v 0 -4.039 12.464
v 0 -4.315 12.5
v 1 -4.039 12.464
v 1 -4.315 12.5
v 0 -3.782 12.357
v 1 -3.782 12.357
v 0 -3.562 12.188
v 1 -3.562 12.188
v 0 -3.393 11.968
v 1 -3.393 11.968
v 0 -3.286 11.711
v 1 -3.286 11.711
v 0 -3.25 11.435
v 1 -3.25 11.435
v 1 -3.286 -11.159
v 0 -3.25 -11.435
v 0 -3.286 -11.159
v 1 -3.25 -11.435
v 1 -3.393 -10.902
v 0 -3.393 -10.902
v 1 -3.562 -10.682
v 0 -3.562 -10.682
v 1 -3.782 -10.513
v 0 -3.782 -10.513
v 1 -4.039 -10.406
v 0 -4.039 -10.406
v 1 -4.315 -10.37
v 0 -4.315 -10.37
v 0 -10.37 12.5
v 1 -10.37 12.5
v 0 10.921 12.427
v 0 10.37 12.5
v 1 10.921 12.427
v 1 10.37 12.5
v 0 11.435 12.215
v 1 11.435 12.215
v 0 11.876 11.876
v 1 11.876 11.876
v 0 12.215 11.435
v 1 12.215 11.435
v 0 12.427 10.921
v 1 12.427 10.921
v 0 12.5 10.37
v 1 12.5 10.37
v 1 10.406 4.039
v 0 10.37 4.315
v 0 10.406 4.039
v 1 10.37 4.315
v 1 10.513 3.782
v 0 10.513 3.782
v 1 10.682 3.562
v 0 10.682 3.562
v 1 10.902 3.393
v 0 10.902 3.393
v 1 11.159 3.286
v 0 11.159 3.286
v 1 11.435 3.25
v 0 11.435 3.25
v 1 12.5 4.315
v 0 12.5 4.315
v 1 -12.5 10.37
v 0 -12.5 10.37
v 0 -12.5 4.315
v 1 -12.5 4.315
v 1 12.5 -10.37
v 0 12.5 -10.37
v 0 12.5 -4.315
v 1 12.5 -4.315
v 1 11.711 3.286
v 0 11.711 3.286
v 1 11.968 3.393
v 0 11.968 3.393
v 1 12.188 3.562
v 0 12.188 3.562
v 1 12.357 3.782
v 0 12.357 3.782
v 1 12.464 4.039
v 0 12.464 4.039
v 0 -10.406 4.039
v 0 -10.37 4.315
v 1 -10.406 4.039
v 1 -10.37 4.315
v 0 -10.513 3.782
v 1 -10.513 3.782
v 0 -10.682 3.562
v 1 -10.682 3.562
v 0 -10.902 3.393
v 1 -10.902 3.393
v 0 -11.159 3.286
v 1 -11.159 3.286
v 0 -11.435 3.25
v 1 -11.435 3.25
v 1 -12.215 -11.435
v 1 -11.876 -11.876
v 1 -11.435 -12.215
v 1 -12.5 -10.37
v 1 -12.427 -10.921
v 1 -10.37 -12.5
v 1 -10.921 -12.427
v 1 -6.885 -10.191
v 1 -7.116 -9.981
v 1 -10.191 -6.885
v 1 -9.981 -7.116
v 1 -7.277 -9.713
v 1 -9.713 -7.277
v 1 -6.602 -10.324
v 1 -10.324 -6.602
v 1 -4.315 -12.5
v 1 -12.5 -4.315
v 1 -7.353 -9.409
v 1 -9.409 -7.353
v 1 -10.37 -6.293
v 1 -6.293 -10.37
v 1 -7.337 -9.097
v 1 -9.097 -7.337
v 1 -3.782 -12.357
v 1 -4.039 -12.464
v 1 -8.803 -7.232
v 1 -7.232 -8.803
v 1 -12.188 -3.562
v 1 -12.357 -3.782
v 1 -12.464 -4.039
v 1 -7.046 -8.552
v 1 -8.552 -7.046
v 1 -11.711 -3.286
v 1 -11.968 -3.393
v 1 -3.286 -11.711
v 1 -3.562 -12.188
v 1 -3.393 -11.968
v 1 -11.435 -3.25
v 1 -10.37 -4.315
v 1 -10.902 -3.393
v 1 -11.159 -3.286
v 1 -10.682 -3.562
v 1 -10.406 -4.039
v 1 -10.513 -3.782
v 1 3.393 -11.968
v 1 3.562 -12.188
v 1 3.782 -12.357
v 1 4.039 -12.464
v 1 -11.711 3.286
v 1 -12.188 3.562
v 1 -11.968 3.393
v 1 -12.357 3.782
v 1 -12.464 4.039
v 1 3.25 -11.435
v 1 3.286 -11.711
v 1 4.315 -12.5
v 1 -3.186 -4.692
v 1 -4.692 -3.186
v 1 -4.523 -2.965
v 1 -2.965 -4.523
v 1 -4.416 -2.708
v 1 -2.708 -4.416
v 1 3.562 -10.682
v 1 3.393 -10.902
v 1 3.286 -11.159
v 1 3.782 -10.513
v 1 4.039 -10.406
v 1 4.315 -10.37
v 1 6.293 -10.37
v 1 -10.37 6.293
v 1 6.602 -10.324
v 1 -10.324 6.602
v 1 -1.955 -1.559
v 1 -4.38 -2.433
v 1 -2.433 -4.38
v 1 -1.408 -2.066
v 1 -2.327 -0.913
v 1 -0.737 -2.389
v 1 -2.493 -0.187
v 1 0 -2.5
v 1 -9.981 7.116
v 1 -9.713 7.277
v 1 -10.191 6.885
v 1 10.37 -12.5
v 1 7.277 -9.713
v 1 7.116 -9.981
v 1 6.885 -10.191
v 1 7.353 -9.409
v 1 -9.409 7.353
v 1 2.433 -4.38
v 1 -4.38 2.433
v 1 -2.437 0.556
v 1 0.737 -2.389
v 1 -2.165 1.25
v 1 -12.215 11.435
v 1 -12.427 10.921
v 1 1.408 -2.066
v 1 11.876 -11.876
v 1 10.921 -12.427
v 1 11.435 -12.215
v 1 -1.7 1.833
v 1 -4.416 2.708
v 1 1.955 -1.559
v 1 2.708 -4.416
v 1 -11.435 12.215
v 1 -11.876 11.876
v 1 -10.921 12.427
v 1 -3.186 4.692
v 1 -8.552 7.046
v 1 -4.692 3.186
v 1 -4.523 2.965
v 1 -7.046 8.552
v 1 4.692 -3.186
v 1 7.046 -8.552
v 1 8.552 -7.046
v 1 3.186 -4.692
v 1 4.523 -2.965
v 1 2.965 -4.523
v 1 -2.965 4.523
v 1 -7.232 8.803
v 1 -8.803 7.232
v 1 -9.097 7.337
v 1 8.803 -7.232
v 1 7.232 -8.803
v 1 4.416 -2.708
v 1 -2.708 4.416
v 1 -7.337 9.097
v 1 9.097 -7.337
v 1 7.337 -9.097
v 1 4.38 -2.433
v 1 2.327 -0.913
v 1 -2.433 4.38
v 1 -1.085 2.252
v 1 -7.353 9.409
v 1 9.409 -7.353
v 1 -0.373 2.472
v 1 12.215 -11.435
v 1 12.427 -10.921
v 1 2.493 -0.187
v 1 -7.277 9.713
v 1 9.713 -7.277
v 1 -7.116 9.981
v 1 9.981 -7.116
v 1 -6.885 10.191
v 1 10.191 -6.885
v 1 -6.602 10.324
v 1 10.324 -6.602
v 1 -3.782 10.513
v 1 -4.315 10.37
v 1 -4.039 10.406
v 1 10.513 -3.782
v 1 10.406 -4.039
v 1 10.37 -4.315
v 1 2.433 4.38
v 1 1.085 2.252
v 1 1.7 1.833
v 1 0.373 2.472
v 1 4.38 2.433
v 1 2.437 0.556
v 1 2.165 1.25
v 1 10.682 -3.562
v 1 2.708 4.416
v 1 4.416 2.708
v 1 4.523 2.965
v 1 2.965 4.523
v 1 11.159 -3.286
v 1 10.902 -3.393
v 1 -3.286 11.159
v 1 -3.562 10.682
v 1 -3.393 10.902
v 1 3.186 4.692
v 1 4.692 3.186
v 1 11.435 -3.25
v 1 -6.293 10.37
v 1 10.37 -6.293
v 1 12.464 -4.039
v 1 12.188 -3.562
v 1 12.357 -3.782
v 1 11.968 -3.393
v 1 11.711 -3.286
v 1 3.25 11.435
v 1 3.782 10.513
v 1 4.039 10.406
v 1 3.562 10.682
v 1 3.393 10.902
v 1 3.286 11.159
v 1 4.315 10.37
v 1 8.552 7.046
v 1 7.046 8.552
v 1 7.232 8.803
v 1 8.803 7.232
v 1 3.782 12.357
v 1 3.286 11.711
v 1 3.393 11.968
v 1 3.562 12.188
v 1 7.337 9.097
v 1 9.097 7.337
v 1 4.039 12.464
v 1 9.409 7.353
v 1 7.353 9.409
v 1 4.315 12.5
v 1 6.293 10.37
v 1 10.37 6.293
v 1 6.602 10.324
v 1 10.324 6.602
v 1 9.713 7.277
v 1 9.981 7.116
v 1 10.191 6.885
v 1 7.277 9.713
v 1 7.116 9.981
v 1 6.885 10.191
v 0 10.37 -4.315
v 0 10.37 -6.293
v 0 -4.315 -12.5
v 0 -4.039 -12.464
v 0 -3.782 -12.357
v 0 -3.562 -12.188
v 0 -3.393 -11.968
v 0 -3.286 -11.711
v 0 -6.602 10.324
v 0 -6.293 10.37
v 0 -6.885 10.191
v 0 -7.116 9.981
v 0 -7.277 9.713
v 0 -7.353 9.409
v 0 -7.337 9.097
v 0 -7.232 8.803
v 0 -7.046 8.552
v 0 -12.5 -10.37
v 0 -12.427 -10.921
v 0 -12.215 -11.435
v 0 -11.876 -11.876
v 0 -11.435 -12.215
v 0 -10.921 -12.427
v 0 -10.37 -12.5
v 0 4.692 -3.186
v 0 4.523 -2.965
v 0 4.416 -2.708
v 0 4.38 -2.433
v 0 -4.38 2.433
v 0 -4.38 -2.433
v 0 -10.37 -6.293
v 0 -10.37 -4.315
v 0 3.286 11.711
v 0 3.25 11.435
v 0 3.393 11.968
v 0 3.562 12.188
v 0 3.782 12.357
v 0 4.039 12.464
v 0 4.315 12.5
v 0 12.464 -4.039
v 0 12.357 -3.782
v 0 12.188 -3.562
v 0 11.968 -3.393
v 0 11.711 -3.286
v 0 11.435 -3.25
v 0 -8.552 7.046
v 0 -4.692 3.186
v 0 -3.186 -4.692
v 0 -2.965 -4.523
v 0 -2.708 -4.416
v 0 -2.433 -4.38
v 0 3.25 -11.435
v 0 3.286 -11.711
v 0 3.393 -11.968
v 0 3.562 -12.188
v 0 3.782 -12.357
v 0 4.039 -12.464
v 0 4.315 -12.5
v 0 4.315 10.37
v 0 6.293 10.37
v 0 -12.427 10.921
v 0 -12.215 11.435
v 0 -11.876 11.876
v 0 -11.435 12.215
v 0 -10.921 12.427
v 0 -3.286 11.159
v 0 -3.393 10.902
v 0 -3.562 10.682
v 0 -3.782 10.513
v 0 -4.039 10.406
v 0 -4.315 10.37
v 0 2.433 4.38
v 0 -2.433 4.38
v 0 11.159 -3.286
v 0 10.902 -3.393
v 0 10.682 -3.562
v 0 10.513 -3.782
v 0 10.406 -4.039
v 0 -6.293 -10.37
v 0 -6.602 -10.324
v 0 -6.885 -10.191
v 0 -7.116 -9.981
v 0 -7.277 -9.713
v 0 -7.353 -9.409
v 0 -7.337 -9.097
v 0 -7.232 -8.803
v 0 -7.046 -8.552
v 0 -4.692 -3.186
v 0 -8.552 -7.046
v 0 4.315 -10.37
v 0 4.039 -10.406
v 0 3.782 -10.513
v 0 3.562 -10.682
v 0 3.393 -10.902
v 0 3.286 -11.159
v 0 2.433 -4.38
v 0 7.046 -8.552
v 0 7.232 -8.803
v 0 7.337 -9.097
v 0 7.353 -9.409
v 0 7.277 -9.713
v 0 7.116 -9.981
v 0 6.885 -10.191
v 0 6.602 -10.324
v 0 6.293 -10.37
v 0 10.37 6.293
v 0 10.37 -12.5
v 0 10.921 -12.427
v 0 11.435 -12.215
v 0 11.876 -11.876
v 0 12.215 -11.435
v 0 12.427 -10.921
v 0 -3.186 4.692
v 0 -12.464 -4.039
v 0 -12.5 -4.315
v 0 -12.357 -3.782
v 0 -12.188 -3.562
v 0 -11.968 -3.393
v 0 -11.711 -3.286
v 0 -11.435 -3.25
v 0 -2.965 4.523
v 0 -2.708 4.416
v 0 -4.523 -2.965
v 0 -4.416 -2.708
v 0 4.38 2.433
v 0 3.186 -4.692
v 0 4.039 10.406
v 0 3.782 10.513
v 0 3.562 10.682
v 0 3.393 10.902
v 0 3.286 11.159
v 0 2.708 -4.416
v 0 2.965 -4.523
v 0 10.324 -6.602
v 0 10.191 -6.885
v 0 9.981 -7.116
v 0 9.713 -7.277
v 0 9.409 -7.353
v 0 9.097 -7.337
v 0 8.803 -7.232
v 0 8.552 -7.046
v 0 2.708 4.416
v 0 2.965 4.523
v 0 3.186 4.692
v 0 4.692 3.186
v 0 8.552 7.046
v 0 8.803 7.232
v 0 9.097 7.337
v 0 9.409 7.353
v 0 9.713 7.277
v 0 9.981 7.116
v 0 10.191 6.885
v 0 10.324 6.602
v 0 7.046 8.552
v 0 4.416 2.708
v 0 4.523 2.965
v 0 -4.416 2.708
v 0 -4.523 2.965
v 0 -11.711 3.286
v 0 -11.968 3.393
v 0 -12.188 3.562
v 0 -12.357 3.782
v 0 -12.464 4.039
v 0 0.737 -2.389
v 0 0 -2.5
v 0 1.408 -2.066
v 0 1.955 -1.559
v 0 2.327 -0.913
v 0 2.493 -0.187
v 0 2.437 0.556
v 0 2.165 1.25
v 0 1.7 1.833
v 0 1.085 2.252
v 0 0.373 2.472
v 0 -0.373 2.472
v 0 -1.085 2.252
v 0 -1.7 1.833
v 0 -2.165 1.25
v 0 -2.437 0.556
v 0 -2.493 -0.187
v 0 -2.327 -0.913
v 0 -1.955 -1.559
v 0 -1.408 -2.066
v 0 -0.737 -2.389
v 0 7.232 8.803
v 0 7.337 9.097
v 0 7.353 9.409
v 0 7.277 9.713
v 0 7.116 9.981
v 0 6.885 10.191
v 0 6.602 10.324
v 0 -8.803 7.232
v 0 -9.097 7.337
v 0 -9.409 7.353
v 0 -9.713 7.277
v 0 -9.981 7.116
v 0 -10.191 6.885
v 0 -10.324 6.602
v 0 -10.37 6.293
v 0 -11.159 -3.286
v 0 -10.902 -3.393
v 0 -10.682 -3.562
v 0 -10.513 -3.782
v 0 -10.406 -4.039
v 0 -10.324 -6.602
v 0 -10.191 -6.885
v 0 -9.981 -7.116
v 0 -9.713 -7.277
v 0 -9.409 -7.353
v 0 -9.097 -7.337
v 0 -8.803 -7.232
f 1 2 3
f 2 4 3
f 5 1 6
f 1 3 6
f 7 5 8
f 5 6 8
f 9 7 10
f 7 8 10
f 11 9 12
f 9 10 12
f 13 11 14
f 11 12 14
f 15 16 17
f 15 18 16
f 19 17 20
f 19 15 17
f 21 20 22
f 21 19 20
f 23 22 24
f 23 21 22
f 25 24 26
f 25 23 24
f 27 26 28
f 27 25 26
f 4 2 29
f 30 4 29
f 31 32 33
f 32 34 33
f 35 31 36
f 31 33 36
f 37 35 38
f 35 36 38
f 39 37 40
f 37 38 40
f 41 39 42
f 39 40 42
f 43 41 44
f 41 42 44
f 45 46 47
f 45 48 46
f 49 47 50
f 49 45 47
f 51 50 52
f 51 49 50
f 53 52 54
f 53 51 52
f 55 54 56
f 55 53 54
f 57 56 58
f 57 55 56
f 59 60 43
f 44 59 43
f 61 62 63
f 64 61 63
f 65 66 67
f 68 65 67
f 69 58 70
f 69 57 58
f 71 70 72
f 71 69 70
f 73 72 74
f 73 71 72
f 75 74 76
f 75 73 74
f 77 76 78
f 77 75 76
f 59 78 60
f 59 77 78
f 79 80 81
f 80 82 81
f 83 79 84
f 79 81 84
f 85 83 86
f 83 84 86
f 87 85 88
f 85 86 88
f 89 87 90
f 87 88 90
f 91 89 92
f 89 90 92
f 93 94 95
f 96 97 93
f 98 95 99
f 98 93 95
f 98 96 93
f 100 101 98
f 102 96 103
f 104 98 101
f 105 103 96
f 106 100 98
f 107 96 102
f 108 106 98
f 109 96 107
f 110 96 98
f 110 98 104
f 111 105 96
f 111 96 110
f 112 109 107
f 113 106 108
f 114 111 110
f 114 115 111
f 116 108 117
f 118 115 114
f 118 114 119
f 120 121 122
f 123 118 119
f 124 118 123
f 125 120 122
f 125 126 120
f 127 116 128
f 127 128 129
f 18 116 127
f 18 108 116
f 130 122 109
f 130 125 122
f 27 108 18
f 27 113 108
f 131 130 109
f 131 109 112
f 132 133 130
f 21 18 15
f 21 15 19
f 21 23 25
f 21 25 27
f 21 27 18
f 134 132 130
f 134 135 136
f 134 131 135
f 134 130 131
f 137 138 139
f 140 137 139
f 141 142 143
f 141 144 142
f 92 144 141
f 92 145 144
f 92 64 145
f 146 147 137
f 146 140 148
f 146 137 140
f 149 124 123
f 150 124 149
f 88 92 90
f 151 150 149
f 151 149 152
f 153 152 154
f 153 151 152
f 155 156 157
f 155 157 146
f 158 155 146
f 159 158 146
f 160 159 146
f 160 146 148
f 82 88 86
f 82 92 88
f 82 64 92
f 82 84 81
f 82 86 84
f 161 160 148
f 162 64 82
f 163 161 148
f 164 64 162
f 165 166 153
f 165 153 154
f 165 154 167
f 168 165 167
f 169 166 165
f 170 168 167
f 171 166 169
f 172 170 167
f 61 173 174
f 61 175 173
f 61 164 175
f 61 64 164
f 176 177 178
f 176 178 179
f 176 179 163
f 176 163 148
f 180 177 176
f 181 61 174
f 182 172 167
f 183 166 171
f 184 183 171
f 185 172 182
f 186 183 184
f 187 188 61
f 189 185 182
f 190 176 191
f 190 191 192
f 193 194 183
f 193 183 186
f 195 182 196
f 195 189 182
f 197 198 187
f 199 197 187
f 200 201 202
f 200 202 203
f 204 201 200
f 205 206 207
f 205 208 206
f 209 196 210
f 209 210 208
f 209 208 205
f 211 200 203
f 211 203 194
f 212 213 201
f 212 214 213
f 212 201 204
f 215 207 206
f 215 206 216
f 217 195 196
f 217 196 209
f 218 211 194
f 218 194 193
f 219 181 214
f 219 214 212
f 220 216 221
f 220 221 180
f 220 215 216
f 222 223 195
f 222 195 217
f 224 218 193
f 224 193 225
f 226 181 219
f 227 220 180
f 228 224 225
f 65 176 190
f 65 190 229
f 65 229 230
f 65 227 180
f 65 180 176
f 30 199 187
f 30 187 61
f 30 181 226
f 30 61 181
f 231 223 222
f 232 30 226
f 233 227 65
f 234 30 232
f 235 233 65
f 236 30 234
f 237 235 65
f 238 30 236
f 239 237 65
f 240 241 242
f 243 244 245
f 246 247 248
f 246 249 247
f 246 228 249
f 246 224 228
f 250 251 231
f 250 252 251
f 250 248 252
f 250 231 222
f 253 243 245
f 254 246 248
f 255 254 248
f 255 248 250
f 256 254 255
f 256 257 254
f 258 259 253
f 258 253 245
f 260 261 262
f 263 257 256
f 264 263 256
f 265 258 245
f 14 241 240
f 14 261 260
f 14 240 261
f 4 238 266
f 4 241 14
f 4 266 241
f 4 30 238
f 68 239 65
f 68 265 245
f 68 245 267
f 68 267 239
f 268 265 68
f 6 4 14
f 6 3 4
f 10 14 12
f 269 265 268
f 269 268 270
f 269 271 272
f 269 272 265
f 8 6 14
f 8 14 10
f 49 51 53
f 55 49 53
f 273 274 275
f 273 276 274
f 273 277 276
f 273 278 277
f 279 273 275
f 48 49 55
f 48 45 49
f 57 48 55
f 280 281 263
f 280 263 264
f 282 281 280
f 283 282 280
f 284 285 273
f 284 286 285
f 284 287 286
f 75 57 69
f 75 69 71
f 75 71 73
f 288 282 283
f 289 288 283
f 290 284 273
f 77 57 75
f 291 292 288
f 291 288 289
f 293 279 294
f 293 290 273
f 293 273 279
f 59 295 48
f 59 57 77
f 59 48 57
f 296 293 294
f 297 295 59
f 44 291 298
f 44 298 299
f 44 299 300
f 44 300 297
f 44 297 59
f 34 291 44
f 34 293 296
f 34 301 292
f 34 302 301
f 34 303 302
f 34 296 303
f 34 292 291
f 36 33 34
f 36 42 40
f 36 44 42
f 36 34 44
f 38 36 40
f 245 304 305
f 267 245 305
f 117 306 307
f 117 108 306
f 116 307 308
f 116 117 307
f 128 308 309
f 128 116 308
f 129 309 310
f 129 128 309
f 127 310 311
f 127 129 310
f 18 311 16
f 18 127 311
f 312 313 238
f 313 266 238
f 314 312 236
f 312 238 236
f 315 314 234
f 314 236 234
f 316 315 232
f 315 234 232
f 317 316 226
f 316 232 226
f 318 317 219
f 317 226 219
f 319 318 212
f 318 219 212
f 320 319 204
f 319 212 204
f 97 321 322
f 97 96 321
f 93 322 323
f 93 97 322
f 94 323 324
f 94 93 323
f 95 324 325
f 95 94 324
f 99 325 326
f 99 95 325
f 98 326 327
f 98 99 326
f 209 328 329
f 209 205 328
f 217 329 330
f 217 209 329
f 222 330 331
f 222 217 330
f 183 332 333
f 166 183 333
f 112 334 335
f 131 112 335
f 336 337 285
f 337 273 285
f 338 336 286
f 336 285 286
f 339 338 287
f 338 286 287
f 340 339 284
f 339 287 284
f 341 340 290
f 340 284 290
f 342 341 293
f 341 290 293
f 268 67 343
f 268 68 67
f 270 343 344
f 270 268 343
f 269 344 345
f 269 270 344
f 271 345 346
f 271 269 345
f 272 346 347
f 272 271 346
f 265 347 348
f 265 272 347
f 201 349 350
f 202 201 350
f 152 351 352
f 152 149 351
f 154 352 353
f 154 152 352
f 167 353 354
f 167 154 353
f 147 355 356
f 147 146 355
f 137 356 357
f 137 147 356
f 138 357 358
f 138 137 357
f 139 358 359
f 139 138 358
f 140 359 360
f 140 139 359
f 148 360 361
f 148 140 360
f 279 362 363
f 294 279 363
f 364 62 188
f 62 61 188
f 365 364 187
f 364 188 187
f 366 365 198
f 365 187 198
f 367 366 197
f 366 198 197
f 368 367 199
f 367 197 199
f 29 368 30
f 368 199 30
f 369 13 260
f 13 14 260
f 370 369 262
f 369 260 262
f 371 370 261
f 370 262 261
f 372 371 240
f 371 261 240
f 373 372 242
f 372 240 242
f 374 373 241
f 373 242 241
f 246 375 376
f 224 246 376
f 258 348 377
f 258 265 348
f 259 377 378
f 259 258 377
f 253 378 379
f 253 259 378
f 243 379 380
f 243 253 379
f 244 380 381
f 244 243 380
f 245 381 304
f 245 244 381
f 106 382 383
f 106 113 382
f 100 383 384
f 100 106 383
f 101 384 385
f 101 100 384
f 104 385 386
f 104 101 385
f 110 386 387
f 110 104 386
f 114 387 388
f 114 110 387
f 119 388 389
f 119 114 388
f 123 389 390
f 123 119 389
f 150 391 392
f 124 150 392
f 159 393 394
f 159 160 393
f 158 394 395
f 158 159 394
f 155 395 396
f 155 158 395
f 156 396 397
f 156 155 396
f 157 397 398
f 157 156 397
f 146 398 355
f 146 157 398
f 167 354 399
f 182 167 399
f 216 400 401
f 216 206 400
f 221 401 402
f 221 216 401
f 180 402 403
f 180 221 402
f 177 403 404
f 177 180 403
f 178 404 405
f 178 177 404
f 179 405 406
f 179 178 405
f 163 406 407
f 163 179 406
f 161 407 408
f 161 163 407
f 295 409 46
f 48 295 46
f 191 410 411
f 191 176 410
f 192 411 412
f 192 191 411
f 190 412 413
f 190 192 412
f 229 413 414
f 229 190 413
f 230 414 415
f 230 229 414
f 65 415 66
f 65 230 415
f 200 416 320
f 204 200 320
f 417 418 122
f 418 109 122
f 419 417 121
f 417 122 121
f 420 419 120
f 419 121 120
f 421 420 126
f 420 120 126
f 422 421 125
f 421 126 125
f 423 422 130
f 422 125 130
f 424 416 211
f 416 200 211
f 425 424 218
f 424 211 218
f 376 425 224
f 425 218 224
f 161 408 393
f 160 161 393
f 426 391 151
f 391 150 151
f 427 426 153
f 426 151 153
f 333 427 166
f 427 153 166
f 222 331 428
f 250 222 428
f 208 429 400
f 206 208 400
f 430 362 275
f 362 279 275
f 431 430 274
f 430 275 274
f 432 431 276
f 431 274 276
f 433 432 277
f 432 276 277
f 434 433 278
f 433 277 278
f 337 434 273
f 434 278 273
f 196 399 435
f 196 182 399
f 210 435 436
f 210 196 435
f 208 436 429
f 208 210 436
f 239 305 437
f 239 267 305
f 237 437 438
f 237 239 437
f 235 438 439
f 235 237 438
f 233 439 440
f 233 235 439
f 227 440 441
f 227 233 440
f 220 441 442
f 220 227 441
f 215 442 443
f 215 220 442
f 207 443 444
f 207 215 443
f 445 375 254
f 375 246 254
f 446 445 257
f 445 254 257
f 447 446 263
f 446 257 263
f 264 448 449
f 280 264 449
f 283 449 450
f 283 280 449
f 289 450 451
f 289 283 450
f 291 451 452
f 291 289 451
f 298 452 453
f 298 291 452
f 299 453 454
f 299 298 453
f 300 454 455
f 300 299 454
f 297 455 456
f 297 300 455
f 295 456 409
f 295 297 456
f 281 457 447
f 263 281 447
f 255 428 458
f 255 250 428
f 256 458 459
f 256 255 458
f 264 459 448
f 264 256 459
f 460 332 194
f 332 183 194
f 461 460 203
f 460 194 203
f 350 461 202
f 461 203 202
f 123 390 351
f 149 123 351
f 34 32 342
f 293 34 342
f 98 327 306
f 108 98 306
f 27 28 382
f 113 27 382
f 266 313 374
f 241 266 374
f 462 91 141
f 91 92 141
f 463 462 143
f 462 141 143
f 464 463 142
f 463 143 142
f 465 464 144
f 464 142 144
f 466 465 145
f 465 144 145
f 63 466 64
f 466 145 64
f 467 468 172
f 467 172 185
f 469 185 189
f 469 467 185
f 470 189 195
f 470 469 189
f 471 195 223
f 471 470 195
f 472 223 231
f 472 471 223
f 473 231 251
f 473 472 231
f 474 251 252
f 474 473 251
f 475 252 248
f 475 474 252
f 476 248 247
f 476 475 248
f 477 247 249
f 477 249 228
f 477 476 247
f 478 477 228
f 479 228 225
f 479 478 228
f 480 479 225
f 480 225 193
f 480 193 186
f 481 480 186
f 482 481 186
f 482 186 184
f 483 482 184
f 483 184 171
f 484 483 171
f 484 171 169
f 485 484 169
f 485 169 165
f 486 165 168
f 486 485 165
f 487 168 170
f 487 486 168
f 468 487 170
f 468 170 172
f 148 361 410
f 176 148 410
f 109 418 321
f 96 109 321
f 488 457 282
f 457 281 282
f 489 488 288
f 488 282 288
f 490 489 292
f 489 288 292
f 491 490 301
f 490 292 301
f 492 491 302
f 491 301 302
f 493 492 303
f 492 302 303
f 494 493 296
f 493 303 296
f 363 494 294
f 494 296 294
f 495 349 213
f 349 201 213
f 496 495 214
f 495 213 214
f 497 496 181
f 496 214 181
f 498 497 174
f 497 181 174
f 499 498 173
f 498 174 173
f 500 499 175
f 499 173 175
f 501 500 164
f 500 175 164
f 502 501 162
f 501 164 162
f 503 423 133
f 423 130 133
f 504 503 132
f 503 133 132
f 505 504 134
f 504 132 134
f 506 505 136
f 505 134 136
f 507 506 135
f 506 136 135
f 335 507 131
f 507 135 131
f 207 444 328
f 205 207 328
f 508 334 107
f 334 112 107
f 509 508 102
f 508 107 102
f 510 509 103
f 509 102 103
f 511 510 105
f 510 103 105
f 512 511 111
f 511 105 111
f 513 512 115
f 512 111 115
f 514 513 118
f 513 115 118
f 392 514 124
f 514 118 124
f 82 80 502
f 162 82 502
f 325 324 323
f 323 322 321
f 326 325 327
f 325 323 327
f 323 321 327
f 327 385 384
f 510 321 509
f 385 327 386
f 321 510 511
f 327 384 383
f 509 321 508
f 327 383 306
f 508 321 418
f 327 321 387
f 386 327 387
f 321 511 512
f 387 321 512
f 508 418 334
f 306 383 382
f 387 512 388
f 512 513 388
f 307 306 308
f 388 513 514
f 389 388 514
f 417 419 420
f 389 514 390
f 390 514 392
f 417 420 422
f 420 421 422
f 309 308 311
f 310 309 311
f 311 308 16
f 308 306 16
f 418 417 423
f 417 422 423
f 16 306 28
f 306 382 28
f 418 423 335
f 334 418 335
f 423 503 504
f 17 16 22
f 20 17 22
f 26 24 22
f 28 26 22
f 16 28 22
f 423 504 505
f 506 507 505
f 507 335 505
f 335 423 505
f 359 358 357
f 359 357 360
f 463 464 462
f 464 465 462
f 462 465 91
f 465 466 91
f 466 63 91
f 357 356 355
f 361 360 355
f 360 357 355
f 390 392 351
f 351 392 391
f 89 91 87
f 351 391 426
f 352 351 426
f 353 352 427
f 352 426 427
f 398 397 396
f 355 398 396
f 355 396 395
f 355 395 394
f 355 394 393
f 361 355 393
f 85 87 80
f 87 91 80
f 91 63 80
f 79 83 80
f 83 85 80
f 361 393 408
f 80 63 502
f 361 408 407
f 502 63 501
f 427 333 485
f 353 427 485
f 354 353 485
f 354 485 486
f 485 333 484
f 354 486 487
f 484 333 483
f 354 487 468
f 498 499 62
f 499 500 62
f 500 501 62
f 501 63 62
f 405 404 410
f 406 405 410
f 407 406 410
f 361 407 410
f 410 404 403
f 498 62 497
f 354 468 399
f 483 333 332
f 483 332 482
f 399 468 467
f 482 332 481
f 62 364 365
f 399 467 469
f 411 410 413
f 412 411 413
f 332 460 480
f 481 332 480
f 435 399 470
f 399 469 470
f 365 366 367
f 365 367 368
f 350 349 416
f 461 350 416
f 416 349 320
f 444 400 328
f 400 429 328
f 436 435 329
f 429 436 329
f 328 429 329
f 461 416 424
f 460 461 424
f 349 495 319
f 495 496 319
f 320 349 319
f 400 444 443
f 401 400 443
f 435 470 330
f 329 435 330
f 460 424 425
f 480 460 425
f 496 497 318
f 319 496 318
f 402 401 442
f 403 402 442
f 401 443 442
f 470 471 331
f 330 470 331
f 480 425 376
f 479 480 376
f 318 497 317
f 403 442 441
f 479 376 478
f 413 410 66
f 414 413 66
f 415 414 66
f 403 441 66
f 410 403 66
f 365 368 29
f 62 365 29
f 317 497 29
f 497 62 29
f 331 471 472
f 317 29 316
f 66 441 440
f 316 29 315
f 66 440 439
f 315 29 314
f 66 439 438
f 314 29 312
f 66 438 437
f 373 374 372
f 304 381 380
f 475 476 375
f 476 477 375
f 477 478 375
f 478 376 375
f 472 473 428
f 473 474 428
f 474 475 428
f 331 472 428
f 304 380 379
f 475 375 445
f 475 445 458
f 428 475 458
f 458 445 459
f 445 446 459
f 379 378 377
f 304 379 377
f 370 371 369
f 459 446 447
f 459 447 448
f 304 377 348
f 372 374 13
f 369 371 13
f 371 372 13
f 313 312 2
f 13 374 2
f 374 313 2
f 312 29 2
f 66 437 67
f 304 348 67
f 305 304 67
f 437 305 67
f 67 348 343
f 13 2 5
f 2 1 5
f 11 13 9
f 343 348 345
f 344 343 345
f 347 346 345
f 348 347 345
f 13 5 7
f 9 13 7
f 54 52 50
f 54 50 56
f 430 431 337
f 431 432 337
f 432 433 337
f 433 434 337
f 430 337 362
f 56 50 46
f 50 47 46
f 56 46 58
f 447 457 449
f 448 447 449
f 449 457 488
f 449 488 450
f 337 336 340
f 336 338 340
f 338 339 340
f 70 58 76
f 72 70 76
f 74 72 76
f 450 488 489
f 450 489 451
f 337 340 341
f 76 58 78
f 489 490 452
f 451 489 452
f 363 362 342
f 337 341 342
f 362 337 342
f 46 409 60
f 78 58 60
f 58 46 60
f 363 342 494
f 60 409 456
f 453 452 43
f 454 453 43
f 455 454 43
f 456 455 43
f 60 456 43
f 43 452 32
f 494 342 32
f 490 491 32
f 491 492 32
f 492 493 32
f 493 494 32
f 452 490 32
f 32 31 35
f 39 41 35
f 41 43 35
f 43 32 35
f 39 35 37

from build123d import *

# Parameters (mm, degrees)
SKETCH1_R           = 2.5
BOSS_EXTRUDE1_DEPTH = 1
FILLET1_R           = 1.065
FILLET2_R           = 2.13


with BuildPart() as part:
    # Sketch1 → Boss-Extrude1 (new body)
    with BuildSketch(Plane.YZ):
        Polygon((-12.5, -3.25), (-12.5, -12.5), (-3.25, -12.5), (-3.25, -10.37), (-8.863862556, -10.37), (-2.873862556, -4.38), (2.873862556, -4.38), (8.863862556, -10.37), (3.25, -10.37), (3.25, -12.5), (12.5, -12.5), (12.5, -3.25), (10.37, -3.25), (10.37, -8.863862556), (4.38, -2.873862556), (4.38, 2.873862556), (10.37, 8.863862556), (10.37, 3.25), (12.5, 3.25), (12.5, 12.5), (3.25, 12.5), (3.25, 10.37), (8.863862556, 10.37), (2.873862556, 4.38), (-2.873862556, 4.38), (-8.863862556, 10.37), (-3.25, 10.37), (-3.25, 12.5), (-12.5, 12.5), (-12.5, 3.25), (-10.37, 3.25), (-10.37, 8.863862556), (-4.38, 2.873862556), (-4.38, -2.873862556), (-10.37, -8.863862556), (-10.37, -3.25), align=None)
        with Locations(Location((0, 0, 0), (0, 0, 270))):
            Circle(SKETCH1_R, mode=Mode.SUBTRACT)
    extrude(amount=BOSS_EXTRUDE1_DEPTH)

    # Fillet1
    fillet1_edges = [part.edges().sort_by_distance(p)[0] for p in [
        (0.5, -10.37, -8.863862556),
        (0.5, 2.873862556, -4.38),
        (0.5, -2.873862556, -4.38),
        (0.5, -4.38, 2.873862556),
        (0.5, -4.38, -2.873862556),
        (0.5, -2.873862556, 4.38),
        (0.5, 2.873862556, 4.38),
        (0.5, 4.38, 2.873862556),
        (0.5, 4.38, -2.873862556),
        (0.5, -8.863862556, -10.37),
        (0.5, 8.863862556, -10.37),
        (0.5, 10.37, -8.863862556),
        (0.5, -10.37, 8.863862556),
        (0.5, -8.863862556, 10.37),
        (0.5, 10.37, 8.863862556),
        (0.5, 8.863862556, 10.37),
        (0.5, 12.5, 3.25),
        (0.5, -3.25, -12.5),
        (0.5, -10.37, 3.25),
        (0.5, 10.37, 3.25),
        (0.5, -10.37, -3.25),
        (0.5, -12.5, -3.25),
        (0.5, -12.5, 3.25),
        (0.5, 3.25, -10.37),
        (0.5, -3.25, -10.37),
        (0.5, 3.25, -12.5),
        (0.5, 10.37, -3.25),
        (0.5, 12.5, -3.25),
        (0.5, 3.25, 12.5),
        (0.5, 3.25, 10.37),
        (0.5, -3.25, 10.37),
        (0.5, -3.25, 12.5),
    ]]
    fillet(fillet1_edges, radius=FILLET1_R - 0.0001)  # a hair under: the kernel refuses the full size

    # Fillet2
    fillet2_edges = [part.edges().sort_by_distance(p)[0] for p in [
        (0.5, -12.5, 12.5),
        (0.5, 12.5, 12.5),
        (0.5, 12.5, -12.5),
        (0.5, -12.5, -12.5),
    ]]
    fillet(fillet2_edges, radius=FILLET2_R)


solid = part.part
